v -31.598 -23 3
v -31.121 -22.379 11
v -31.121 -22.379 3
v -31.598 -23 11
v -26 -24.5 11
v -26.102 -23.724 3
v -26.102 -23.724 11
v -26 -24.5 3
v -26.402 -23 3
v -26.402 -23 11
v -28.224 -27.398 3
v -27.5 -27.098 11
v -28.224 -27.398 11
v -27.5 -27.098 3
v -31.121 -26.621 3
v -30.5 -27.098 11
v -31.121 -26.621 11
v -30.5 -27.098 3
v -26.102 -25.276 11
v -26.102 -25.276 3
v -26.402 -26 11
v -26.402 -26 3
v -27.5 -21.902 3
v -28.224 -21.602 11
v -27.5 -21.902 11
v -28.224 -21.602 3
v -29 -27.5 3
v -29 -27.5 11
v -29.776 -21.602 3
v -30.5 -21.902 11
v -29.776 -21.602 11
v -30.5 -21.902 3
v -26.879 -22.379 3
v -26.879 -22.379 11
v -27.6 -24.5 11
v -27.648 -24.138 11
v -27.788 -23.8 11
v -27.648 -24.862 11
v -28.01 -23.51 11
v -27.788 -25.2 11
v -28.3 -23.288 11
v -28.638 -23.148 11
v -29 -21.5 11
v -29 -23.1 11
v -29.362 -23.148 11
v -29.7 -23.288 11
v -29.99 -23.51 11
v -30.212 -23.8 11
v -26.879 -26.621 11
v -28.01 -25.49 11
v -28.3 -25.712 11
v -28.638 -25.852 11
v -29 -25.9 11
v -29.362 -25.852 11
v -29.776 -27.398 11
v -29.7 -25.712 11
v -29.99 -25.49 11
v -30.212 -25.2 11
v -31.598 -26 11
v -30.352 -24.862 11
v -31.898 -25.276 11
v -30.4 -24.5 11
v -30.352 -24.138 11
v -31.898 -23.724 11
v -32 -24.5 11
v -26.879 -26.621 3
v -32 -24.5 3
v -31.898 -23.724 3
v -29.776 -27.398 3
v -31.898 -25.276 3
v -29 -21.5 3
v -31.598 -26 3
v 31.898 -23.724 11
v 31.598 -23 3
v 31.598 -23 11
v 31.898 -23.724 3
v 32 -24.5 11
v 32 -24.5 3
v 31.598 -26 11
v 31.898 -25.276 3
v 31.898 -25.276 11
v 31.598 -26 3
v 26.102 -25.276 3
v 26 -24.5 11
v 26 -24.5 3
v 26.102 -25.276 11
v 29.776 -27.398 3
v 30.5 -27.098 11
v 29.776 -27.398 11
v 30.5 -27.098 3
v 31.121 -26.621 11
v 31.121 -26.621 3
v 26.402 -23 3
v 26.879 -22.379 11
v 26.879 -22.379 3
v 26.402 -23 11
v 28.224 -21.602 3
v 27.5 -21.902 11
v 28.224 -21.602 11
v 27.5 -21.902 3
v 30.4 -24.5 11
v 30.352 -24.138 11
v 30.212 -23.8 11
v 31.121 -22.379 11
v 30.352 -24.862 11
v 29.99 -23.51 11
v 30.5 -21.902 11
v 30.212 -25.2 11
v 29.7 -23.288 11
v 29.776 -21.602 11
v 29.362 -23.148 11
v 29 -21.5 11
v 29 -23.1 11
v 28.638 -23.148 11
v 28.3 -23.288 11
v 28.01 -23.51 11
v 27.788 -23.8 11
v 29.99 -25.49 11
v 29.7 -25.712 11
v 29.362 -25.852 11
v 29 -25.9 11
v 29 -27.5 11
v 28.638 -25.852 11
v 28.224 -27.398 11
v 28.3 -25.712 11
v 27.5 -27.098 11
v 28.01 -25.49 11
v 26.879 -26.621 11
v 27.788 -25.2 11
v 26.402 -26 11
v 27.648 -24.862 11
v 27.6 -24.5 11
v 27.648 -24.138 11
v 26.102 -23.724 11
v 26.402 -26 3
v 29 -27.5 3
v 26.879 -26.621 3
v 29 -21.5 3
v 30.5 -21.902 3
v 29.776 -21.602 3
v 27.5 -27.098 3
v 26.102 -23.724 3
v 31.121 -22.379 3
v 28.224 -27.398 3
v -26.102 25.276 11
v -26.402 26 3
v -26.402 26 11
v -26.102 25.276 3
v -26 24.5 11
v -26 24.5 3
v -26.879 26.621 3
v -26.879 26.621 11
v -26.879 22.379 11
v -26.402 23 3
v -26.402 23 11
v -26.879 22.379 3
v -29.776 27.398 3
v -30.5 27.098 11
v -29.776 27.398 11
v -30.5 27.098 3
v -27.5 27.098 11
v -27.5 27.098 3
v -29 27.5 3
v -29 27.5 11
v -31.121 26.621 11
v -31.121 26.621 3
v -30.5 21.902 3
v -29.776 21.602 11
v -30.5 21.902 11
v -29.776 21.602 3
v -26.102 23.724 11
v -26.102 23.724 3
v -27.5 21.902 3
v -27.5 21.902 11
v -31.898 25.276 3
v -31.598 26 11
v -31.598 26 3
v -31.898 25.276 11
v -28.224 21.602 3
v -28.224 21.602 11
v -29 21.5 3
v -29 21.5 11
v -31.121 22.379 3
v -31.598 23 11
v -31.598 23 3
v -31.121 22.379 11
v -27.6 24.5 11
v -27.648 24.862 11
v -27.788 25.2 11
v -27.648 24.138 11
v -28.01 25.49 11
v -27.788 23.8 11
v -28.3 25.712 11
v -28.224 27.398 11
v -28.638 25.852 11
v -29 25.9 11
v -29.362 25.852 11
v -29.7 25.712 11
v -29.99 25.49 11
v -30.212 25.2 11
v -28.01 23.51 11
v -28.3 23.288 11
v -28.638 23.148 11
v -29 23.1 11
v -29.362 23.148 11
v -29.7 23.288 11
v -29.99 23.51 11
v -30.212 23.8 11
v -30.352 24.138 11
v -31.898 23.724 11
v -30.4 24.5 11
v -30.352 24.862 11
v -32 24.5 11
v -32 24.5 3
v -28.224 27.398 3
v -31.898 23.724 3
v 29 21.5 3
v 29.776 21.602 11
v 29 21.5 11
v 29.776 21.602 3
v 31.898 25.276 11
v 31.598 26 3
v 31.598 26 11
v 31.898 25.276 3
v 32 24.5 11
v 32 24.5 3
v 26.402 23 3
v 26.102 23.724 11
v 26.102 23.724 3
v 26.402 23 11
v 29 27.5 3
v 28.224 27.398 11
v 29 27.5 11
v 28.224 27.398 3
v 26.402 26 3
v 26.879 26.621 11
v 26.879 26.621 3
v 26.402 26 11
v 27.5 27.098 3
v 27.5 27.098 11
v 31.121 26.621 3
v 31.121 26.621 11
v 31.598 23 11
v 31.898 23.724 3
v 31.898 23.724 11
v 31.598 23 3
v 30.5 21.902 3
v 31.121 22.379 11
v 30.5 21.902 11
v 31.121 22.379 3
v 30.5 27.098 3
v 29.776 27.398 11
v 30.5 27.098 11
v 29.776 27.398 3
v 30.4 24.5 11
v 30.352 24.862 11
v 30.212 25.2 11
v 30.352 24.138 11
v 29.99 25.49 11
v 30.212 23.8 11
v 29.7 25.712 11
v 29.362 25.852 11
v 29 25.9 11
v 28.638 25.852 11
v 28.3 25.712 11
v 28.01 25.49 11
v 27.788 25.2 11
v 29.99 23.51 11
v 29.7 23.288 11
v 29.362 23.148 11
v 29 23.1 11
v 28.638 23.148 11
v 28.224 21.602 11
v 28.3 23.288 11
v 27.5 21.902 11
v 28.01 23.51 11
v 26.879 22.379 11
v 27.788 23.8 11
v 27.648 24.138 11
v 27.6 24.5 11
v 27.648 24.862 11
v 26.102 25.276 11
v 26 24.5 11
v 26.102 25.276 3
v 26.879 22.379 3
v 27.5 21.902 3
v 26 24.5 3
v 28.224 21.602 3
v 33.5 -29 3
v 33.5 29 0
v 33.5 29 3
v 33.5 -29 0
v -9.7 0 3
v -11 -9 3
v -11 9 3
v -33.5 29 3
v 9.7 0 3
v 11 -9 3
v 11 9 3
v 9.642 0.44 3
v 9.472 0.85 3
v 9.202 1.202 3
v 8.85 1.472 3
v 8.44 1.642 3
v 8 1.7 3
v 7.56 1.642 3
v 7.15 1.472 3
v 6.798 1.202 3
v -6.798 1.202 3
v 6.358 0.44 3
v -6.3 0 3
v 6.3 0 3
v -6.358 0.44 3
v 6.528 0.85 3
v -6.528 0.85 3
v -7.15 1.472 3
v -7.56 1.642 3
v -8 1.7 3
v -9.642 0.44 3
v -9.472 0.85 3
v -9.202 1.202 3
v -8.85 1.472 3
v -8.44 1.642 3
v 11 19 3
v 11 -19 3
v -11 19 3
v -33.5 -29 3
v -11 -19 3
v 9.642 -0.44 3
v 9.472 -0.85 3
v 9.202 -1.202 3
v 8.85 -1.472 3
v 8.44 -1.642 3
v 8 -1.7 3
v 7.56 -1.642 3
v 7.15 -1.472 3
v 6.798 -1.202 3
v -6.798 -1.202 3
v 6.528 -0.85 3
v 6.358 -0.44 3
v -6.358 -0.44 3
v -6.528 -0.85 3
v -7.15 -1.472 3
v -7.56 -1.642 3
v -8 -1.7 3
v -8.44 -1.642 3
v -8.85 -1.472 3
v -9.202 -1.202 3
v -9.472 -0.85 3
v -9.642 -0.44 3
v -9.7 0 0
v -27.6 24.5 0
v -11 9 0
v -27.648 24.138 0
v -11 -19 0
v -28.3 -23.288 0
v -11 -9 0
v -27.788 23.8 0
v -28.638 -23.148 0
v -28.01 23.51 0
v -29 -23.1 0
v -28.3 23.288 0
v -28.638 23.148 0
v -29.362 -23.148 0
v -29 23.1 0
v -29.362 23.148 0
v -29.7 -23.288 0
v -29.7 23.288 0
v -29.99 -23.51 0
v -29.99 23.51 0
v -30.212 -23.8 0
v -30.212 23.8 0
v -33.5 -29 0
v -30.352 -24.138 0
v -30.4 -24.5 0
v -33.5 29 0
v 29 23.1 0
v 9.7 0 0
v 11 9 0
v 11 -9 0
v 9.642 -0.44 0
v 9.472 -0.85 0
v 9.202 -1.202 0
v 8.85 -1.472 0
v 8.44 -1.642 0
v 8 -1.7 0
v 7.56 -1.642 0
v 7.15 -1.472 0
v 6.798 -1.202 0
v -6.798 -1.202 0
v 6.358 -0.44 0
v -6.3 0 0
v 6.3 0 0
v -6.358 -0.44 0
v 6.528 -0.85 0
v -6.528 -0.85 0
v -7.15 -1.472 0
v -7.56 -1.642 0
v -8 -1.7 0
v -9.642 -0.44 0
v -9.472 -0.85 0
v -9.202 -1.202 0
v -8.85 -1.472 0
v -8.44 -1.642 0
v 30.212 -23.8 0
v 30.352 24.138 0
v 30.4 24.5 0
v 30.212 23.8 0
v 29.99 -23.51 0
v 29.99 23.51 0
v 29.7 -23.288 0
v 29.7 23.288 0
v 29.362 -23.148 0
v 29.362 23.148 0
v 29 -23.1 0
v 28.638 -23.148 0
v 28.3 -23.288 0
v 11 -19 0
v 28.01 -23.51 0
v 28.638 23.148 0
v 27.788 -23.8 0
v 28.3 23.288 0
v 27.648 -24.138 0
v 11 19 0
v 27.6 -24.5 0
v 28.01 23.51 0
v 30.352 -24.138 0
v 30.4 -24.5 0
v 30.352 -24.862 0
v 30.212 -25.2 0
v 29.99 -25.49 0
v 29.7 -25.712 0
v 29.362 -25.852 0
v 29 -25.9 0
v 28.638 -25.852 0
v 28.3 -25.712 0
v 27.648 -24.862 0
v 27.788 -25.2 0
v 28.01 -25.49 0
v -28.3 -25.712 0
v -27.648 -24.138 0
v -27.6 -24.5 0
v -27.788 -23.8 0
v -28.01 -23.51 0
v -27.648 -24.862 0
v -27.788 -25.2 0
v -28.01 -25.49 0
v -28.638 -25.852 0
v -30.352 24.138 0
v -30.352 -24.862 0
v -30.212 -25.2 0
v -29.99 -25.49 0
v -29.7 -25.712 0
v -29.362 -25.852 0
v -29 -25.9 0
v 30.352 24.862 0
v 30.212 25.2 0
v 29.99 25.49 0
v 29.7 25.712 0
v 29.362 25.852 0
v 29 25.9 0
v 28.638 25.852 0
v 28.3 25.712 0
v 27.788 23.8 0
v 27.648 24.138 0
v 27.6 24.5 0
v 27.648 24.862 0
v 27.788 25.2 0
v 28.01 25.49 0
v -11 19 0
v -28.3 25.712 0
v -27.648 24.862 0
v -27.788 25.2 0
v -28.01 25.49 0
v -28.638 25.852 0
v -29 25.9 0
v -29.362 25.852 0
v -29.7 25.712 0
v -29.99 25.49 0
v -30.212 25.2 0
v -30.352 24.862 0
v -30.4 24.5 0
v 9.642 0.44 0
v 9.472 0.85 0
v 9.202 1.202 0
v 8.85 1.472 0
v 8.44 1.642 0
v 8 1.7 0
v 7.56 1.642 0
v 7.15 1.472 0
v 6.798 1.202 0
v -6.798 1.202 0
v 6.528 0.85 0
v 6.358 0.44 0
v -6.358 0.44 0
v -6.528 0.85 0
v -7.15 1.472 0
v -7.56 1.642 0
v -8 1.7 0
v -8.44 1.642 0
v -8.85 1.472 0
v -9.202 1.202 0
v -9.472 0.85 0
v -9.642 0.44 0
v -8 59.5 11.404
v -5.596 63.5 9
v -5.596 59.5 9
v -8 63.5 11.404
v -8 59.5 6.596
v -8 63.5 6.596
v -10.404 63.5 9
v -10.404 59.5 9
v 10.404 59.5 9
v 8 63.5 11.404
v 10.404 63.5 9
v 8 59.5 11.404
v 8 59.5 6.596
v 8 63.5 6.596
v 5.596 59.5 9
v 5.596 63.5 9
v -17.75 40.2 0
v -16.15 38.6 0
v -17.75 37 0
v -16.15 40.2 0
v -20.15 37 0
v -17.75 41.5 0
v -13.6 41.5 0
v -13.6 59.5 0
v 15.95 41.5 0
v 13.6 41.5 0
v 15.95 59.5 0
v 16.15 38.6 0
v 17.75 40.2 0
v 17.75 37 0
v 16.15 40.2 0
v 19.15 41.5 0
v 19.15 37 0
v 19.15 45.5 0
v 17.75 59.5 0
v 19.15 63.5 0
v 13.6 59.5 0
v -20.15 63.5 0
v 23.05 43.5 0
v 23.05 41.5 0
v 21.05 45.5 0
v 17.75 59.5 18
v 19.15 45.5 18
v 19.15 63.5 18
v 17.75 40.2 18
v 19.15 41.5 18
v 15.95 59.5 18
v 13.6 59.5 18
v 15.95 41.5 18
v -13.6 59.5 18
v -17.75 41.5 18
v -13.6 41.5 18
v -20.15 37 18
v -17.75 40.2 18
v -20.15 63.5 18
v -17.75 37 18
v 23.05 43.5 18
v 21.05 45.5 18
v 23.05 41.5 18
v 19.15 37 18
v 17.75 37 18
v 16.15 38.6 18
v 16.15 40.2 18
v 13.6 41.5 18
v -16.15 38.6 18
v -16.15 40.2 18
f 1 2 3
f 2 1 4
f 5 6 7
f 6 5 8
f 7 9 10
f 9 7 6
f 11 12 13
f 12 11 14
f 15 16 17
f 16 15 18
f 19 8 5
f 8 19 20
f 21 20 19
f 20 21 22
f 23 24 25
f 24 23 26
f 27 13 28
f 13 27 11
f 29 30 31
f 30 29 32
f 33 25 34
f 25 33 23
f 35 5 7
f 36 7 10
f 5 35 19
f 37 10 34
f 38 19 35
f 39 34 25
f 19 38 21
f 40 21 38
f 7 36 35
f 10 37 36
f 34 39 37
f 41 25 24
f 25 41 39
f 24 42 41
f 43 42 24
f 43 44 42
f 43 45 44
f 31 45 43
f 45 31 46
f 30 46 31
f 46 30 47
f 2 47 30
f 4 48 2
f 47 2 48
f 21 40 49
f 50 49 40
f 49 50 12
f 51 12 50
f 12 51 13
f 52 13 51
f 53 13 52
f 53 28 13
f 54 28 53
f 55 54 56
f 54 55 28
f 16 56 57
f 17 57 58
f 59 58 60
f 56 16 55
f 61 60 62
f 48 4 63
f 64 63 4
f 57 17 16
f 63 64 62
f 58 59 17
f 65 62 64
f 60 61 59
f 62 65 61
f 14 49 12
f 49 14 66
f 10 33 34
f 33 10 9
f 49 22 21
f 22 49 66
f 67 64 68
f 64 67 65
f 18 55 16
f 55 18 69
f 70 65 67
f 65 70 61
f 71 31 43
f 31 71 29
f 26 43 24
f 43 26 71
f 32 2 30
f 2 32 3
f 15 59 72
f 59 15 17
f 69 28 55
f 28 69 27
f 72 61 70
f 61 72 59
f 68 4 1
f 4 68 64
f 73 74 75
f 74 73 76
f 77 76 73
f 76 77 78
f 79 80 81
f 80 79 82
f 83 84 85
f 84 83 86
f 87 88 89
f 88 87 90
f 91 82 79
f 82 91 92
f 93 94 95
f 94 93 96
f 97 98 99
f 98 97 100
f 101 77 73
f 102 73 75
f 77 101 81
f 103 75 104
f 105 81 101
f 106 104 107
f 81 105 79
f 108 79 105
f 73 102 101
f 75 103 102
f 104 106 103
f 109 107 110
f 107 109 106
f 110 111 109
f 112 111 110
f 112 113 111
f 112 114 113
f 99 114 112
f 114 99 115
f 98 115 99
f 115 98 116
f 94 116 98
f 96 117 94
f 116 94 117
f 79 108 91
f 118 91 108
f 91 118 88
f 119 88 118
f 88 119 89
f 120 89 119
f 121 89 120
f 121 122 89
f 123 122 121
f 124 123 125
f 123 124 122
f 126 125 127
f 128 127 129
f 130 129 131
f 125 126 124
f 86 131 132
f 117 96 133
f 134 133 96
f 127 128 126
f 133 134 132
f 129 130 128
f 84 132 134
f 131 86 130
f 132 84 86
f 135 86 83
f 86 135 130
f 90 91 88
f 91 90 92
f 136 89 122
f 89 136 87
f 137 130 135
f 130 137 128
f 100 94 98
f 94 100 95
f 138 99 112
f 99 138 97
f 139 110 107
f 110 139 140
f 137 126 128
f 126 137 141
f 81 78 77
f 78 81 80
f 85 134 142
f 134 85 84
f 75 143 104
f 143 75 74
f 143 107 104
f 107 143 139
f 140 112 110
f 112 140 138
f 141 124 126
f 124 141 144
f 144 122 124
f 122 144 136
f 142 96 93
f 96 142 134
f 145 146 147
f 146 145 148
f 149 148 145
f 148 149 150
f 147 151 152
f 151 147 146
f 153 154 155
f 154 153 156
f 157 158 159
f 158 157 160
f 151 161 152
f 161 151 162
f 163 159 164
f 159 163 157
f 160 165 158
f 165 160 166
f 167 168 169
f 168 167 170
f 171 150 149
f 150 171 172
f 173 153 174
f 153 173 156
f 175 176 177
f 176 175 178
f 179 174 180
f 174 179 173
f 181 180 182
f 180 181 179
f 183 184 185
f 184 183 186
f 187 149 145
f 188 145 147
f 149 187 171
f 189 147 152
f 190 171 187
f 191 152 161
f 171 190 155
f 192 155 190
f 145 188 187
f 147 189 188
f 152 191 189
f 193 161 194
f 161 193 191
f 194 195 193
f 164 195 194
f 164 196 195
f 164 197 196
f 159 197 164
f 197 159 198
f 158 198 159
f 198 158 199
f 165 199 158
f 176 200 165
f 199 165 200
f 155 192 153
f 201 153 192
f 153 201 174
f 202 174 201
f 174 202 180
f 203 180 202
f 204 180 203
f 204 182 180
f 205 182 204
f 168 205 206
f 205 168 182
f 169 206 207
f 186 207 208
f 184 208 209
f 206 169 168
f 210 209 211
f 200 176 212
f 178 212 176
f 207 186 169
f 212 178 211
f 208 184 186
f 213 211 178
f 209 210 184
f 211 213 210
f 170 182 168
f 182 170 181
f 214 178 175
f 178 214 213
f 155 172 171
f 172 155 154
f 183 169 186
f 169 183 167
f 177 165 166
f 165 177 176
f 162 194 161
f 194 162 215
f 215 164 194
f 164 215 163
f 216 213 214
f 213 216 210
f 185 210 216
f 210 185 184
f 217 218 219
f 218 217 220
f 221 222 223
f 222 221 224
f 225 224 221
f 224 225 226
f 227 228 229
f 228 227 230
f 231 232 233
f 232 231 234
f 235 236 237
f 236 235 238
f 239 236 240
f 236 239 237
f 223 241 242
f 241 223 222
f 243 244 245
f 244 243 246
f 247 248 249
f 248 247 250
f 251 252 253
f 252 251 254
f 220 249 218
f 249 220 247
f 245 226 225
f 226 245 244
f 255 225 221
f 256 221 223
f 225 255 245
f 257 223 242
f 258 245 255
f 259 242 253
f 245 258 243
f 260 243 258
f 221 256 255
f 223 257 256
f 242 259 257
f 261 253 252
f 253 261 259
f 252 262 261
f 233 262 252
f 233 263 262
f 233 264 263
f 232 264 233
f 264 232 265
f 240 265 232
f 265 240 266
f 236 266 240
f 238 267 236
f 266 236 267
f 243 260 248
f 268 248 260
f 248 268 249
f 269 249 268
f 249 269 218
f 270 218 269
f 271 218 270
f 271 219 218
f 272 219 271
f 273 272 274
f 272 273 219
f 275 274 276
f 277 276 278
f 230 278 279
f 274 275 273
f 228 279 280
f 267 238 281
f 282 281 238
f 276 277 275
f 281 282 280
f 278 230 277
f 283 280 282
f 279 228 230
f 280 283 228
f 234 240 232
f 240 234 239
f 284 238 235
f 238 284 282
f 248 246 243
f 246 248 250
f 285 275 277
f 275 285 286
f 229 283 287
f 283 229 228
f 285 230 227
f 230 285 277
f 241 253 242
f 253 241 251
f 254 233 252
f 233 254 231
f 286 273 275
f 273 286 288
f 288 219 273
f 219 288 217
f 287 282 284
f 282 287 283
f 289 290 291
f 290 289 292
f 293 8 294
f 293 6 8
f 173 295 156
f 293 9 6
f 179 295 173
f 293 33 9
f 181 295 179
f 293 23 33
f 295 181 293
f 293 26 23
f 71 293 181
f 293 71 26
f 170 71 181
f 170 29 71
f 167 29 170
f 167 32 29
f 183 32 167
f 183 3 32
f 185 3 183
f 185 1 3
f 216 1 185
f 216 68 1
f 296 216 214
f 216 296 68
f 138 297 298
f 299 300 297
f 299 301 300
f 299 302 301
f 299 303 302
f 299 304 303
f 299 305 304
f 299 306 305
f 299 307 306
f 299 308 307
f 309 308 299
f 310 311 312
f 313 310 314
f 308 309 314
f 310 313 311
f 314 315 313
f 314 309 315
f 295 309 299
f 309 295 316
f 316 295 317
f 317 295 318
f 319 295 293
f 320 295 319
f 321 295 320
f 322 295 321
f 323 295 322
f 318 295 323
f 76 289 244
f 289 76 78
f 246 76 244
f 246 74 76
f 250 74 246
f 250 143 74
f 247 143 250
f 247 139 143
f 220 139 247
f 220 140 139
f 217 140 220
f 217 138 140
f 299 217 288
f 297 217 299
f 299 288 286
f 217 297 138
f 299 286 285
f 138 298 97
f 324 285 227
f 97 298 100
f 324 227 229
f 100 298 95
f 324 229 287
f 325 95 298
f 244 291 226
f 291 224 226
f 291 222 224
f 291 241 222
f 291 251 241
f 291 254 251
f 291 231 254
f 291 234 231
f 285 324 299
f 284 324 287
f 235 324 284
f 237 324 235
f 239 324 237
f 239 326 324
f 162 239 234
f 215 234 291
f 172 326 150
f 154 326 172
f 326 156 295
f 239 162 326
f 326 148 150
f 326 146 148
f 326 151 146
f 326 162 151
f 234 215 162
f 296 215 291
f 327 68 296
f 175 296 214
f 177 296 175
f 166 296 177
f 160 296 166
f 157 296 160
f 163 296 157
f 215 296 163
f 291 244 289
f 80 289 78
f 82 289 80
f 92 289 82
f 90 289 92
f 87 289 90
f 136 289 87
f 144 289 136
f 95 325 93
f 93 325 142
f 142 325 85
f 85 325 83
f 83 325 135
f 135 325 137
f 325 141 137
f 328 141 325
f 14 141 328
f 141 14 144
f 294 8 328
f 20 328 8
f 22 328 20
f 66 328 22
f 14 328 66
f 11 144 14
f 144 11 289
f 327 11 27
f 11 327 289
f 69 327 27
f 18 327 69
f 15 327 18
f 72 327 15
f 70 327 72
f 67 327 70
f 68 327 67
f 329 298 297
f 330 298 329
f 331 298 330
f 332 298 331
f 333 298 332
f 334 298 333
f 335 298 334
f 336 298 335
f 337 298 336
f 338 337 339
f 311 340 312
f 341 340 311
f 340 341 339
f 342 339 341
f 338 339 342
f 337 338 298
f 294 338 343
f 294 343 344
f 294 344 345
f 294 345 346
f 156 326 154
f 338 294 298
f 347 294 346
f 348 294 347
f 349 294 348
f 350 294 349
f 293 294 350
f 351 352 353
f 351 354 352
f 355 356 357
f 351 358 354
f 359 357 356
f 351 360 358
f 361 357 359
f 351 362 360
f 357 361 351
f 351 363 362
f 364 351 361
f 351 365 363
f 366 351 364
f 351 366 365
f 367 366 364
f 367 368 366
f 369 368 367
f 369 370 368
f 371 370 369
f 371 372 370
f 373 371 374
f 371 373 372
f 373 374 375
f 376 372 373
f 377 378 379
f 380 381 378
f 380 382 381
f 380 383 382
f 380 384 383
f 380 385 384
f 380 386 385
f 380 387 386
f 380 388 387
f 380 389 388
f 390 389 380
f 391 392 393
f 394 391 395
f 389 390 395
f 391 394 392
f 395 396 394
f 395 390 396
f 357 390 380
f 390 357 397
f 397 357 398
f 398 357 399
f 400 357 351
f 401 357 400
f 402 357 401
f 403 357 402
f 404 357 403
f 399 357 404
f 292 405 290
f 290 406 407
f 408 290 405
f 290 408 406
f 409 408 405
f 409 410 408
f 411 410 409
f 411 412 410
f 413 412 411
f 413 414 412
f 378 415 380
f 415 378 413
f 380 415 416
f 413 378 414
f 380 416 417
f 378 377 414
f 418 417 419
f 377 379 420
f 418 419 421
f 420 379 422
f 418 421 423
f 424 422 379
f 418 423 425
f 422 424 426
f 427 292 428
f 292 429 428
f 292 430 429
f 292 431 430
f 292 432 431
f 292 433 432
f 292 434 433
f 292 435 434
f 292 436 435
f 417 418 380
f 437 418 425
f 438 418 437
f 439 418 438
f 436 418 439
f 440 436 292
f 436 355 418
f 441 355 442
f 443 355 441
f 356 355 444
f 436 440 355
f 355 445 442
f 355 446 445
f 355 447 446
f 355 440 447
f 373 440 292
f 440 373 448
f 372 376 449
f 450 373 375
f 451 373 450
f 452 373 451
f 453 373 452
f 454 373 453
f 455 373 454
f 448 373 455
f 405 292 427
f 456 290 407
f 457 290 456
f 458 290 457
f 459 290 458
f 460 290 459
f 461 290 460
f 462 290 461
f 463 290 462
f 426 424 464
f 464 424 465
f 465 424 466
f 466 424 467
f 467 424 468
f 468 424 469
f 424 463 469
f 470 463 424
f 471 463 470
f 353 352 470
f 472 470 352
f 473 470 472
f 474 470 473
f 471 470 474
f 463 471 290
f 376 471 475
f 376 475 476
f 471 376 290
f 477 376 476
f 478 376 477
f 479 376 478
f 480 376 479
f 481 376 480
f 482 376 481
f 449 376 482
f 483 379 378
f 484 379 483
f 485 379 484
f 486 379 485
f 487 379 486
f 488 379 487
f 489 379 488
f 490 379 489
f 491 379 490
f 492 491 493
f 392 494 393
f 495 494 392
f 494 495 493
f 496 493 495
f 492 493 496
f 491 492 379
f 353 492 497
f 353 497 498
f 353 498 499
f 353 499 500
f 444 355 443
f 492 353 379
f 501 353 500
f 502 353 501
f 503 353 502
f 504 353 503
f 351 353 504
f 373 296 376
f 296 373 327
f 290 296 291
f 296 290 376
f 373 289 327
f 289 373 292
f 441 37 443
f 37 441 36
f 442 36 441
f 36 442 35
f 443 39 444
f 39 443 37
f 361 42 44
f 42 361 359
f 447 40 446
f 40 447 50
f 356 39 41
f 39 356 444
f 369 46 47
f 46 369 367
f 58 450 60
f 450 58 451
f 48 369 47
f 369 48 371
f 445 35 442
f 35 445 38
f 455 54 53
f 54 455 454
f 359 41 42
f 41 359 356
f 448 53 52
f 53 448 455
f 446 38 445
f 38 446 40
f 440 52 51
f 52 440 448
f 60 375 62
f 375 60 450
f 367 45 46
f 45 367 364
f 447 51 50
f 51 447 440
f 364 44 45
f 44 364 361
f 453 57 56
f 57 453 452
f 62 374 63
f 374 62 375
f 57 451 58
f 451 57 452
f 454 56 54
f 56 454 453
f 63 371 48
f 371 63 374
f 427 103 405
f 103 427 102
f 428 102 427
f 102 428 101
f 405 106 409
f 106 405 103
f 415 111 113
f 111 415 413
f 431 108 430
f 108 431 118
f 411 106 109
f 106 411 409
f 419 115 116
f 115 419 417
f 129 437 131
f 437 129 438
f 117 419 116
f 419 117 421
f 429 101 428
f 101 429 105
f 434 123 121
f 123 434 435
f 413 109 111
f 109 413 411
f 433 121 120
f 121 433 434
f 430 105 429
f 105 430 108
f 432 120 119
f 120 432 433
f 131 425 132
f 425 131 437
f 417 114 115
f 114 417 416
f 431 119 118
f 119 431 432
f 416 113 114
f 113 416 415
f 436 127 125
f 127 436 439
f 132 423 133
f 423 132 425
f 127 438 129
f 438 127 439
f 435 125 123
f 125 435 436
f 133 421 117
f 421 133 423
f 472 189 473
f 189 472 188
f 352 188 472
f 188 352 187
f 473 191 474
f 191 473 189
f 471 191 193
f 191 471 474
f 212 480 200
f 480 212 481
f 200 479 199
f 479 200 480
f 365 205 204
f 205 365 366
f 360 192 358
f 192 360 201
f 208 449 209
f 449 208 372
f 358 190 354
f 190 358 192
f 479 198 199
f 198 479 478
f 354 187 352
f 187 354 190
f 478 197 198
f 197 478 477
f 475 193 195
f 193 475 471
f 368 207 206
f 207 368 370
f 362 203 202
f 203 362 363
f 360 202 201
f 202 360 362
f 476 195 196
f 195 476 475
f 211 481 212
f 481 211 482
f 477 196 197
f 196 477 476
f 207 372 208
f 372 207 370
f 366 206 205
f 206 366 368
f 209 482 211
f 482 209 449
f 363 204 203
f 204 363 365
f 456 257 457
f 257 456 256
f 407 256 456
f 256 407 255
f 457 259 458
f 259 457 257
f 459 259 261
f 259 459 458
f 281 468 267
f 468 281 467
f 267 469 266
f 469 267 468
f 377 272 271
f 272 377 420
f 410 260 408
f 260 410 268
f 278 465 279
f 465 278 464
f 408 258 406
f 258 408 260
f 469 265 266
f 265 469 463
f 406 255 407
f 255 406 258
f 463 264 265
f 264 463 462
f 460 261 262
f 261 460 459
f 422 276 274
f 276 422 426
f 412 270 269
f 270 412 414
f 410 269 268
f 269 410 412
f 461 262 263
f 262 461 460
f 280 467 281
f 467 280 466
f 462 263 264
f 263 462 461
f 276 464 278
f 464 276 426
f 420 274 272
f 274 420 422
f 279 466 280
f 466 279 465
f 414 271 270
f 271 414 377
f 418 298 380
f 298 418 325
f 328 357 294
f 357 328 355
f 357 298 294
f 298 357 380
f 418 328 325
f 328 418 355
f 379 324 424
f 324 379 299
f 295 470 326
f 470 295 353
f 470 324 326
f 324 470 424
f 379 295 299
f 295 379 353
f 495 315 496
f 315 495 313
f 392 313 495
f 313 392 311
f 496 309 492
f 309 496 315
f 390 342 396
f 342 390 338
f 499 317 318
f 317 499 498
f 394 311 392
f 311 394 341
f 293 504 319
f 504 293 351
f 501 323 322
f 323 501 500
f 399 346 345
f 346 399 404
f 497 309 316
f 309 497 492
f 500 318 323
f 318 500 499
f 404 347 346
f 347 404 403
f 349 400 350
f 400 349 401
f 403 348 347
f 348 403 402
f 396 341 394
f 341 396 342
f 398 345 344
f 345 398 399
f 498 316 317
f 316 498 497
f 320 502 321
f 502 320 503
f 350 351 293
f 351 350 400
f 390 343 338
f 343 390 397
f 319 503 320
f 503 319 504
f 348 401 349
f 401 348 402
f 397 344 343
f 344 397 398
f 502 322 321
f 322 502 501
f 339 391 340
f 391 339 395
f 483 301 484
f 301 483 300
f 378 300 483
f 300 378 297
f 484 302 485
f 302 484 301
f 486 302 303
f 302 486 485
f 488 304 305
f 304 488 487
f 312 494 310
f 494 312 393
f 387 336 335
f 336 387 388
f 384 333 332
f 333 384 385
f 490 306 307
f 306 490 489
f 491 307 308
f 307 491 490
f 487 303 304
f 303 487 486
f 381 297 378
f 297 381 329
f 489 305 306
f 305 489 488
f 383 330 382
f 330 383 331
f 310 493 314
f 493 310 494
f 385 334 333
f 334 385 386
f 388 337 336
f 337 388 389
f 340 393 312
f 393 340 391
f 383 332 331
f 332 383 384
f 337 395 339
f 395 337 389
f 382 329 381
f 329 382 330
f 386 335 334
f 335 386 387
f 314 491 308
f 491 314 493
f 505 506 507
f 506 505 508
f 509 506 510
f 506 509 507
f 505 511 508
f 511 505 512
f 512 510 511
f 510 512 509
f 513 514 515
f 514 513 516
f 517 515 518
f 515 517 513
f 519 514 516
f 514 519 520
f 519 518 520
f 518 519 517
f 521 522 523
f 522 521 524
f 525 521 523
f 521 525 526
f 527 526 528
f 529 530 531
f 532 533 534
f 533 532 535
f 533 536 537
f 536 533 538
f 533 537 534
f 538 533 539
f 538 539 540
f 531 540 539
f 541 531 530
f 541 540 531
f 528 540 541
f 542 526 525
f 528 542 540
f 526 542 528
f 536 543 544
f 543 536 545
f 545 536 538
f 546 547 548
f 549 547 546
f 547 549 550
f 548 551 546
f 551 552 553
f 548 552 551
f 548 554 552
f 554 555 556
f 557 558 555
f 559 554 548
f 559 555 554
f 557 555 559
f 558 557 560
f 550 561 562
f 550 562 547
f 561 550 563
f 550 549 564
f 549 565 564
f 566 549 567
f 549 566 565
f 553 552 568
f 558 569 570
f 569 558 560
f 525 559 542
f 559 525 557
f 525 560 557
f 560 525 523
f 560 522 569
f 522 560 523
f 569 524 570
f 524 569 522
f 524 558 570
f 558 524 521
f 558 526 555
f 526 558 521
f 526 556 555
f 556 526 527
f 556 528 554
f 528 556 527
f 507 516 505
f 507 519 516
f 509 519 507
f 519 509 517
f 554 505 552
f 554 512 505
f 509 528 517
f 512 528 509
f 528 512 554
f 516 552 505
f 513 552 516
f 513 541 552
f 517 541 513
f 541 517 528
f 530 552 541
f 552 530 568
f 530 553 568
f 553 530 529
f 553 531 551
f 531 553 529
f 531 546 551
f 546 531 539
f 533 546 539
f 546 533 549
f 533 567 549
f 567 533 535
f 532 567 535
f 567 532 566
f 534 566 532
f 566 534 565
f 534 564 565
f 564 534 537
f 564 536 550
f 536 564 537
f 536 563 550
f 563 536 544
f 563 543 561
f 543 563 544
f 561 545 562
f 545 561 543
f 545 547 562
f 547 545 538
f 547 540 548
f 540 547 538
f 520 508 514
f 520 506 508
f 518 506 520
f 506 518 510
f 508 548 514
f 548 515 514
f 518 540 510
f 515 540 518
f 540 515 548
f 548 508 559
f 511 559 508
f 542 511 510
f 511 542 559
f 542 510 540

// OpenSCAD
// Raspberry Pi 4 / 5 DIN rail carrier: a flat plate and a separate spring clip.
// PETG recommended. Print both parts as laid out on Z=0, standoffs upward;
// no supports, 0.2 mm layers, at least 4 perimeters. Keep the latch gap clear.
// Join the clip front to the plate UNDERSIDE using two M3x12 bolts + nuts
// (default dimensions); fit nuts inside the open clip bridge before snapping.
// Board hardware: four M2.5 through-bolts + nuts, length chosen for the
// 3 mm plate + 8 mm standoff + PCB + washers/nut (about 16 mm default).
// Put bolt heads below the plate; use insulating washers against the PCB.
// Official Pi 4B / Pi 5 holes: (3.5,3.5), (61.5,3.5), (3.5,52.5), (61.5,52.5)
// from the lower-left, component side up, USB/Ethernet at right,
// on the 85 x 56 mm board. Pattern is 58 x 49 mm; PCB hole diameter 2.7 mm.
// The compact plate ends before the Ethernet/USB overhang; ports stay open.
// https://datasheets.raspberrypi.com/rpi4/raspberry-pi-4-mechanical-drawing.pdf
// https://datasheets.raspberrypi.com/rpi5/raspberry-pi-5-mechanical-drawing.pdf
// Fits TS35 / EN 60715 / IEC 60715 top-hat rail, 7.5 or 15 mm deep.
// Default interface: 35 mm overall, 1 mm flange; rail_inner locates the seats.
// Depth does not enter the fit: only the outer flange edges are gripped.
// For 1.5 mm sheet (e.g. TS35 x 15), set flange_thickness = 1.5.
// Nominal fit: 0.30 mm TOTAL slot play, 0.25 mm at each outer edge,
// and 1.35 mm retaining overlap per lip (hook_overlap - edge_clearance).
// The beam deflects during engagement; the seated rail has clearance,
// not spring preload. Use rail end stops where sliding must be prevented.
// Checked on the dev server with separate 7.5/1 and 15/1.5 mm rail sections;
// geometry checks do not establish printed spring strength or fatigue life.
// Hook the rigid left lip first, then press the right ramp over the rail.
// Pull the right-hand tab outward to release; do not bend the whole carrier.
// Original geometry; fit-test the clip before fitting electronics.
// Rail references:
// https://eshop.weidmueller.com/en/ts-35x7-5ll-1mstzn/p/0514510000
// https://assets.dam.weidmueller.com/assets/api/ab2b4e3c-189d-4eae-b435-7c5a77e1ac25/Original/MB_BUILDING_EN_2025_WEB.pdf

/* [Carrier] */
plate_thickness = 3; // Flat carrier thickness, mm [2.4:0.2:4]
standoff_height = 8; // Board underside clearance above plate, mm [6:1:12]
standoff_diameter = 6; // Boss diameter around each board hole, mm [5.8:0.2:7]
board_hole = 2.8; // Board screw clearance through the carrier, mm [2.7:0.1:3]
edge_margin = 4.5; // Plate border beyond mounting-hole centres, mm [4:0.5:7]
vent_width = 22; // Width of each cooling window, mm [16:1:26]
vent_height = 10; // Height of each cooling window, mm [6:1:12]
part_gap = 8; // Separation between the two printed parts, mm [6:2:16]
hole_pitch_x = 58; // Official Pi 4/5 hole pitch along board, mm (standard dimension)
hole_pitch_y = 49; // Official Pi 4/5 hole pitch across board, mm (standard dimension)

/* [Rail fit] */
rail_width = 35; // Outside flange width, mm [34.8:0.1:35.2]
rail_inner = 25; // Seat-position reference; need not match the rail web, mm [24:0.5:27]
flange_thickness = 1; // Measured sheet thickness, mm [1:0.1:1.5]
fit_clearance = 0.3; // Total flange slot clearance, mm [0.2:0.05:0.4]
edge_clearance = 0.25; // Clearance at each outer rail edge, mm [0.2:0.05:0.4]
spring_wall = 1.4; // Flexible beam thickness, mm [1.2:0.1:1.6]
spring_length = 18; // Beam root distance above the rail face, mm [18:1:24]
hook_overlap = 1.6; // Tooth reach inward from the side wall, mm [1.4:0.1:1.8]
clip_width = 18; // Contact length along the rail, mm [14:2:30]
bridge_thickness = 4; // Front mounting bridge thickness, mm [3:0.5:5]
mount_spacing = 16; // Two M3 attachment centres across rail, mm [12:2:20]
mount_hole = 3.4; // M3 shaft clearance, mm [3.3:0.1:3.6]

/* [Hidden] */
$fn = 24; // Facets per circular hole / standoff
cut_extra = 0.1; // Boolean cutter overlap, mm
rigid_wall = 2.4; // Rigid hook side wall thickness, mm
tooth_thickness = 1.6; // Minimum retaining lip thickness, mm
seat_gap = 1.8; // Air gap beside the spring, mm
edge = rail_width/2 + edge_clearance; // Outer side-wall datum, mm
slot = flange_thickness + fit_clearance; // Flange capture slot height, mm
front = spring_length + bridge_thickness; // Mounting face Y coordinate, mm
seat_inner = rail_inner/2 + 1.1; // Keep seats outside the inner opening, mm
seat_outer = edge - seat_gap; // Spring-side rigid seat outer edge, mm

// Cross-section lies in XY. Rail length is Z; rail front is Y=0.
// All material below Y=0 stays within the outer 1.8 mm of each flange.
// The independent right beam flexes in XY, along continuous print layers.
module clip_profile() {
    union() {
        translate([-edge-rigid_wall,spring_length])
            square([2*edge+rigid_wall+spring_wall,bridge_thickness]);
        // Rigid side and the left flange's front seat.
        translate([-edge-rigid_wall,0])
            square([edge+rigid_wall-seat_inner,spring_length+0.1]);
        polygon([[-edge-rigid_wall,0],[-edge,0],[-edge,-slot],
                 [-edge+hook_overlap,-slot],
                 [-edge+hook_overlap,-slot-tooth_thickness],
                 [-edge,-slot-tooth_thickness-hook_overlap],
                 [-edge-rigid_wall,-slot-tooth_thickness-hook_overlap]]);
        // Right seat is separated from the beam all the way to its root.
        translate([seat_inner,0])
            square([seat_outer-seat_inner,spring_length+0.1]);
        polygon([[edge,-slot-tooth_thickness-hook_overlap],
                 [edge+spring_wall,-slot-tooth_thickness-hook_overlap],
                 [edge+spring_wall,spring_length+0.1],
                 [edge,spring_length+0.1],[edge,-slot],
                 [edge-hook_overlap,-slot],
                 [edge-hook_overlap,-slot-tooth_thickness]]);
        // Solid thumb / screwdriver tab, with a chamfered outside corner.
        translate([edge+spring_wall-0.1,0])
            polygon([[0,0],[4,0],[4,2],[2,4],[0,4]]);
    }
}

holes = [[-hole_pitch_x/2,-hole_pitch_y/2],[hole_pitch_x/2,-hole_pitch_y/2],
         [-hole_pitch_x/2,hole_pitch_y/2],[hole_pitch_x/2,hole_pitch_y/2]]; // Centred PCB hole coordinates, mm
plate_x = hole_pitch_x + 2*edge_margin; // Derived plate width, mm
plate_y = hole_pitch_y + 2*edge_margin; // Derived plate depth, mm

// Diamond bores have 45-degree roofs and accept a round M3 shaft.
// Their across-flats dimension is mount_hole, not the corner-to-corner size.
module attachment_bores() {
    for (x = [-mount_spacing/2,mount_spacing/2])
        translate([x,front+cut_extra,clip_width/2])
            rotate([90,0,0])
                linear_extrude(bridge_thickness+2*cut_extra)
                    rotate(45) square([mount_hole,mount_hole],center=true);
}

module rail_clip() {
    difference() {
        linear_extrude(clip_width) clip_profile();
        attachment_bores();
    }
}

module board_carrier() {
    difference() {
        union() {
            translate([-plate_x/2,-plate_y/2,0])
                cube([plate_x,plate_y,plate_thickness]);
            for (p = holes)
                translate([p[0],p[1],plate_thickness-cut_extra])
                    cylinder(h=standoff_height+cut_extra,d=standoff_diameter);
        }
        for (p = holes)
            translate([p[0],p[1],-cut_extra])
                cylinder(h=plate_thickness+standoff_height+2*cut_extra,d=board_hole);
        // Leave a solid centre band for the clip and room for bolt heads.
        for (y = [-14,14])
            translate([-vent_width/2,y-vent_height/2,-cut_extra])
                cube([vent_width,vent_height,plate_thickness+2*cut_extra]);
        for (x = [-mount_spacing/2,mount_spacing/2])
            translate([x,0,-cut_extra])
                cylinder(h=plate_thickness+2*cut_extra,d=mount_hole);
    }
}

color("#f59ab8") board_carrier();
color("#d9dde2") translate([0,plate_y/2+part_gap+slot+tooth_thickness+hook_overlap,0])
    rail_clip();
